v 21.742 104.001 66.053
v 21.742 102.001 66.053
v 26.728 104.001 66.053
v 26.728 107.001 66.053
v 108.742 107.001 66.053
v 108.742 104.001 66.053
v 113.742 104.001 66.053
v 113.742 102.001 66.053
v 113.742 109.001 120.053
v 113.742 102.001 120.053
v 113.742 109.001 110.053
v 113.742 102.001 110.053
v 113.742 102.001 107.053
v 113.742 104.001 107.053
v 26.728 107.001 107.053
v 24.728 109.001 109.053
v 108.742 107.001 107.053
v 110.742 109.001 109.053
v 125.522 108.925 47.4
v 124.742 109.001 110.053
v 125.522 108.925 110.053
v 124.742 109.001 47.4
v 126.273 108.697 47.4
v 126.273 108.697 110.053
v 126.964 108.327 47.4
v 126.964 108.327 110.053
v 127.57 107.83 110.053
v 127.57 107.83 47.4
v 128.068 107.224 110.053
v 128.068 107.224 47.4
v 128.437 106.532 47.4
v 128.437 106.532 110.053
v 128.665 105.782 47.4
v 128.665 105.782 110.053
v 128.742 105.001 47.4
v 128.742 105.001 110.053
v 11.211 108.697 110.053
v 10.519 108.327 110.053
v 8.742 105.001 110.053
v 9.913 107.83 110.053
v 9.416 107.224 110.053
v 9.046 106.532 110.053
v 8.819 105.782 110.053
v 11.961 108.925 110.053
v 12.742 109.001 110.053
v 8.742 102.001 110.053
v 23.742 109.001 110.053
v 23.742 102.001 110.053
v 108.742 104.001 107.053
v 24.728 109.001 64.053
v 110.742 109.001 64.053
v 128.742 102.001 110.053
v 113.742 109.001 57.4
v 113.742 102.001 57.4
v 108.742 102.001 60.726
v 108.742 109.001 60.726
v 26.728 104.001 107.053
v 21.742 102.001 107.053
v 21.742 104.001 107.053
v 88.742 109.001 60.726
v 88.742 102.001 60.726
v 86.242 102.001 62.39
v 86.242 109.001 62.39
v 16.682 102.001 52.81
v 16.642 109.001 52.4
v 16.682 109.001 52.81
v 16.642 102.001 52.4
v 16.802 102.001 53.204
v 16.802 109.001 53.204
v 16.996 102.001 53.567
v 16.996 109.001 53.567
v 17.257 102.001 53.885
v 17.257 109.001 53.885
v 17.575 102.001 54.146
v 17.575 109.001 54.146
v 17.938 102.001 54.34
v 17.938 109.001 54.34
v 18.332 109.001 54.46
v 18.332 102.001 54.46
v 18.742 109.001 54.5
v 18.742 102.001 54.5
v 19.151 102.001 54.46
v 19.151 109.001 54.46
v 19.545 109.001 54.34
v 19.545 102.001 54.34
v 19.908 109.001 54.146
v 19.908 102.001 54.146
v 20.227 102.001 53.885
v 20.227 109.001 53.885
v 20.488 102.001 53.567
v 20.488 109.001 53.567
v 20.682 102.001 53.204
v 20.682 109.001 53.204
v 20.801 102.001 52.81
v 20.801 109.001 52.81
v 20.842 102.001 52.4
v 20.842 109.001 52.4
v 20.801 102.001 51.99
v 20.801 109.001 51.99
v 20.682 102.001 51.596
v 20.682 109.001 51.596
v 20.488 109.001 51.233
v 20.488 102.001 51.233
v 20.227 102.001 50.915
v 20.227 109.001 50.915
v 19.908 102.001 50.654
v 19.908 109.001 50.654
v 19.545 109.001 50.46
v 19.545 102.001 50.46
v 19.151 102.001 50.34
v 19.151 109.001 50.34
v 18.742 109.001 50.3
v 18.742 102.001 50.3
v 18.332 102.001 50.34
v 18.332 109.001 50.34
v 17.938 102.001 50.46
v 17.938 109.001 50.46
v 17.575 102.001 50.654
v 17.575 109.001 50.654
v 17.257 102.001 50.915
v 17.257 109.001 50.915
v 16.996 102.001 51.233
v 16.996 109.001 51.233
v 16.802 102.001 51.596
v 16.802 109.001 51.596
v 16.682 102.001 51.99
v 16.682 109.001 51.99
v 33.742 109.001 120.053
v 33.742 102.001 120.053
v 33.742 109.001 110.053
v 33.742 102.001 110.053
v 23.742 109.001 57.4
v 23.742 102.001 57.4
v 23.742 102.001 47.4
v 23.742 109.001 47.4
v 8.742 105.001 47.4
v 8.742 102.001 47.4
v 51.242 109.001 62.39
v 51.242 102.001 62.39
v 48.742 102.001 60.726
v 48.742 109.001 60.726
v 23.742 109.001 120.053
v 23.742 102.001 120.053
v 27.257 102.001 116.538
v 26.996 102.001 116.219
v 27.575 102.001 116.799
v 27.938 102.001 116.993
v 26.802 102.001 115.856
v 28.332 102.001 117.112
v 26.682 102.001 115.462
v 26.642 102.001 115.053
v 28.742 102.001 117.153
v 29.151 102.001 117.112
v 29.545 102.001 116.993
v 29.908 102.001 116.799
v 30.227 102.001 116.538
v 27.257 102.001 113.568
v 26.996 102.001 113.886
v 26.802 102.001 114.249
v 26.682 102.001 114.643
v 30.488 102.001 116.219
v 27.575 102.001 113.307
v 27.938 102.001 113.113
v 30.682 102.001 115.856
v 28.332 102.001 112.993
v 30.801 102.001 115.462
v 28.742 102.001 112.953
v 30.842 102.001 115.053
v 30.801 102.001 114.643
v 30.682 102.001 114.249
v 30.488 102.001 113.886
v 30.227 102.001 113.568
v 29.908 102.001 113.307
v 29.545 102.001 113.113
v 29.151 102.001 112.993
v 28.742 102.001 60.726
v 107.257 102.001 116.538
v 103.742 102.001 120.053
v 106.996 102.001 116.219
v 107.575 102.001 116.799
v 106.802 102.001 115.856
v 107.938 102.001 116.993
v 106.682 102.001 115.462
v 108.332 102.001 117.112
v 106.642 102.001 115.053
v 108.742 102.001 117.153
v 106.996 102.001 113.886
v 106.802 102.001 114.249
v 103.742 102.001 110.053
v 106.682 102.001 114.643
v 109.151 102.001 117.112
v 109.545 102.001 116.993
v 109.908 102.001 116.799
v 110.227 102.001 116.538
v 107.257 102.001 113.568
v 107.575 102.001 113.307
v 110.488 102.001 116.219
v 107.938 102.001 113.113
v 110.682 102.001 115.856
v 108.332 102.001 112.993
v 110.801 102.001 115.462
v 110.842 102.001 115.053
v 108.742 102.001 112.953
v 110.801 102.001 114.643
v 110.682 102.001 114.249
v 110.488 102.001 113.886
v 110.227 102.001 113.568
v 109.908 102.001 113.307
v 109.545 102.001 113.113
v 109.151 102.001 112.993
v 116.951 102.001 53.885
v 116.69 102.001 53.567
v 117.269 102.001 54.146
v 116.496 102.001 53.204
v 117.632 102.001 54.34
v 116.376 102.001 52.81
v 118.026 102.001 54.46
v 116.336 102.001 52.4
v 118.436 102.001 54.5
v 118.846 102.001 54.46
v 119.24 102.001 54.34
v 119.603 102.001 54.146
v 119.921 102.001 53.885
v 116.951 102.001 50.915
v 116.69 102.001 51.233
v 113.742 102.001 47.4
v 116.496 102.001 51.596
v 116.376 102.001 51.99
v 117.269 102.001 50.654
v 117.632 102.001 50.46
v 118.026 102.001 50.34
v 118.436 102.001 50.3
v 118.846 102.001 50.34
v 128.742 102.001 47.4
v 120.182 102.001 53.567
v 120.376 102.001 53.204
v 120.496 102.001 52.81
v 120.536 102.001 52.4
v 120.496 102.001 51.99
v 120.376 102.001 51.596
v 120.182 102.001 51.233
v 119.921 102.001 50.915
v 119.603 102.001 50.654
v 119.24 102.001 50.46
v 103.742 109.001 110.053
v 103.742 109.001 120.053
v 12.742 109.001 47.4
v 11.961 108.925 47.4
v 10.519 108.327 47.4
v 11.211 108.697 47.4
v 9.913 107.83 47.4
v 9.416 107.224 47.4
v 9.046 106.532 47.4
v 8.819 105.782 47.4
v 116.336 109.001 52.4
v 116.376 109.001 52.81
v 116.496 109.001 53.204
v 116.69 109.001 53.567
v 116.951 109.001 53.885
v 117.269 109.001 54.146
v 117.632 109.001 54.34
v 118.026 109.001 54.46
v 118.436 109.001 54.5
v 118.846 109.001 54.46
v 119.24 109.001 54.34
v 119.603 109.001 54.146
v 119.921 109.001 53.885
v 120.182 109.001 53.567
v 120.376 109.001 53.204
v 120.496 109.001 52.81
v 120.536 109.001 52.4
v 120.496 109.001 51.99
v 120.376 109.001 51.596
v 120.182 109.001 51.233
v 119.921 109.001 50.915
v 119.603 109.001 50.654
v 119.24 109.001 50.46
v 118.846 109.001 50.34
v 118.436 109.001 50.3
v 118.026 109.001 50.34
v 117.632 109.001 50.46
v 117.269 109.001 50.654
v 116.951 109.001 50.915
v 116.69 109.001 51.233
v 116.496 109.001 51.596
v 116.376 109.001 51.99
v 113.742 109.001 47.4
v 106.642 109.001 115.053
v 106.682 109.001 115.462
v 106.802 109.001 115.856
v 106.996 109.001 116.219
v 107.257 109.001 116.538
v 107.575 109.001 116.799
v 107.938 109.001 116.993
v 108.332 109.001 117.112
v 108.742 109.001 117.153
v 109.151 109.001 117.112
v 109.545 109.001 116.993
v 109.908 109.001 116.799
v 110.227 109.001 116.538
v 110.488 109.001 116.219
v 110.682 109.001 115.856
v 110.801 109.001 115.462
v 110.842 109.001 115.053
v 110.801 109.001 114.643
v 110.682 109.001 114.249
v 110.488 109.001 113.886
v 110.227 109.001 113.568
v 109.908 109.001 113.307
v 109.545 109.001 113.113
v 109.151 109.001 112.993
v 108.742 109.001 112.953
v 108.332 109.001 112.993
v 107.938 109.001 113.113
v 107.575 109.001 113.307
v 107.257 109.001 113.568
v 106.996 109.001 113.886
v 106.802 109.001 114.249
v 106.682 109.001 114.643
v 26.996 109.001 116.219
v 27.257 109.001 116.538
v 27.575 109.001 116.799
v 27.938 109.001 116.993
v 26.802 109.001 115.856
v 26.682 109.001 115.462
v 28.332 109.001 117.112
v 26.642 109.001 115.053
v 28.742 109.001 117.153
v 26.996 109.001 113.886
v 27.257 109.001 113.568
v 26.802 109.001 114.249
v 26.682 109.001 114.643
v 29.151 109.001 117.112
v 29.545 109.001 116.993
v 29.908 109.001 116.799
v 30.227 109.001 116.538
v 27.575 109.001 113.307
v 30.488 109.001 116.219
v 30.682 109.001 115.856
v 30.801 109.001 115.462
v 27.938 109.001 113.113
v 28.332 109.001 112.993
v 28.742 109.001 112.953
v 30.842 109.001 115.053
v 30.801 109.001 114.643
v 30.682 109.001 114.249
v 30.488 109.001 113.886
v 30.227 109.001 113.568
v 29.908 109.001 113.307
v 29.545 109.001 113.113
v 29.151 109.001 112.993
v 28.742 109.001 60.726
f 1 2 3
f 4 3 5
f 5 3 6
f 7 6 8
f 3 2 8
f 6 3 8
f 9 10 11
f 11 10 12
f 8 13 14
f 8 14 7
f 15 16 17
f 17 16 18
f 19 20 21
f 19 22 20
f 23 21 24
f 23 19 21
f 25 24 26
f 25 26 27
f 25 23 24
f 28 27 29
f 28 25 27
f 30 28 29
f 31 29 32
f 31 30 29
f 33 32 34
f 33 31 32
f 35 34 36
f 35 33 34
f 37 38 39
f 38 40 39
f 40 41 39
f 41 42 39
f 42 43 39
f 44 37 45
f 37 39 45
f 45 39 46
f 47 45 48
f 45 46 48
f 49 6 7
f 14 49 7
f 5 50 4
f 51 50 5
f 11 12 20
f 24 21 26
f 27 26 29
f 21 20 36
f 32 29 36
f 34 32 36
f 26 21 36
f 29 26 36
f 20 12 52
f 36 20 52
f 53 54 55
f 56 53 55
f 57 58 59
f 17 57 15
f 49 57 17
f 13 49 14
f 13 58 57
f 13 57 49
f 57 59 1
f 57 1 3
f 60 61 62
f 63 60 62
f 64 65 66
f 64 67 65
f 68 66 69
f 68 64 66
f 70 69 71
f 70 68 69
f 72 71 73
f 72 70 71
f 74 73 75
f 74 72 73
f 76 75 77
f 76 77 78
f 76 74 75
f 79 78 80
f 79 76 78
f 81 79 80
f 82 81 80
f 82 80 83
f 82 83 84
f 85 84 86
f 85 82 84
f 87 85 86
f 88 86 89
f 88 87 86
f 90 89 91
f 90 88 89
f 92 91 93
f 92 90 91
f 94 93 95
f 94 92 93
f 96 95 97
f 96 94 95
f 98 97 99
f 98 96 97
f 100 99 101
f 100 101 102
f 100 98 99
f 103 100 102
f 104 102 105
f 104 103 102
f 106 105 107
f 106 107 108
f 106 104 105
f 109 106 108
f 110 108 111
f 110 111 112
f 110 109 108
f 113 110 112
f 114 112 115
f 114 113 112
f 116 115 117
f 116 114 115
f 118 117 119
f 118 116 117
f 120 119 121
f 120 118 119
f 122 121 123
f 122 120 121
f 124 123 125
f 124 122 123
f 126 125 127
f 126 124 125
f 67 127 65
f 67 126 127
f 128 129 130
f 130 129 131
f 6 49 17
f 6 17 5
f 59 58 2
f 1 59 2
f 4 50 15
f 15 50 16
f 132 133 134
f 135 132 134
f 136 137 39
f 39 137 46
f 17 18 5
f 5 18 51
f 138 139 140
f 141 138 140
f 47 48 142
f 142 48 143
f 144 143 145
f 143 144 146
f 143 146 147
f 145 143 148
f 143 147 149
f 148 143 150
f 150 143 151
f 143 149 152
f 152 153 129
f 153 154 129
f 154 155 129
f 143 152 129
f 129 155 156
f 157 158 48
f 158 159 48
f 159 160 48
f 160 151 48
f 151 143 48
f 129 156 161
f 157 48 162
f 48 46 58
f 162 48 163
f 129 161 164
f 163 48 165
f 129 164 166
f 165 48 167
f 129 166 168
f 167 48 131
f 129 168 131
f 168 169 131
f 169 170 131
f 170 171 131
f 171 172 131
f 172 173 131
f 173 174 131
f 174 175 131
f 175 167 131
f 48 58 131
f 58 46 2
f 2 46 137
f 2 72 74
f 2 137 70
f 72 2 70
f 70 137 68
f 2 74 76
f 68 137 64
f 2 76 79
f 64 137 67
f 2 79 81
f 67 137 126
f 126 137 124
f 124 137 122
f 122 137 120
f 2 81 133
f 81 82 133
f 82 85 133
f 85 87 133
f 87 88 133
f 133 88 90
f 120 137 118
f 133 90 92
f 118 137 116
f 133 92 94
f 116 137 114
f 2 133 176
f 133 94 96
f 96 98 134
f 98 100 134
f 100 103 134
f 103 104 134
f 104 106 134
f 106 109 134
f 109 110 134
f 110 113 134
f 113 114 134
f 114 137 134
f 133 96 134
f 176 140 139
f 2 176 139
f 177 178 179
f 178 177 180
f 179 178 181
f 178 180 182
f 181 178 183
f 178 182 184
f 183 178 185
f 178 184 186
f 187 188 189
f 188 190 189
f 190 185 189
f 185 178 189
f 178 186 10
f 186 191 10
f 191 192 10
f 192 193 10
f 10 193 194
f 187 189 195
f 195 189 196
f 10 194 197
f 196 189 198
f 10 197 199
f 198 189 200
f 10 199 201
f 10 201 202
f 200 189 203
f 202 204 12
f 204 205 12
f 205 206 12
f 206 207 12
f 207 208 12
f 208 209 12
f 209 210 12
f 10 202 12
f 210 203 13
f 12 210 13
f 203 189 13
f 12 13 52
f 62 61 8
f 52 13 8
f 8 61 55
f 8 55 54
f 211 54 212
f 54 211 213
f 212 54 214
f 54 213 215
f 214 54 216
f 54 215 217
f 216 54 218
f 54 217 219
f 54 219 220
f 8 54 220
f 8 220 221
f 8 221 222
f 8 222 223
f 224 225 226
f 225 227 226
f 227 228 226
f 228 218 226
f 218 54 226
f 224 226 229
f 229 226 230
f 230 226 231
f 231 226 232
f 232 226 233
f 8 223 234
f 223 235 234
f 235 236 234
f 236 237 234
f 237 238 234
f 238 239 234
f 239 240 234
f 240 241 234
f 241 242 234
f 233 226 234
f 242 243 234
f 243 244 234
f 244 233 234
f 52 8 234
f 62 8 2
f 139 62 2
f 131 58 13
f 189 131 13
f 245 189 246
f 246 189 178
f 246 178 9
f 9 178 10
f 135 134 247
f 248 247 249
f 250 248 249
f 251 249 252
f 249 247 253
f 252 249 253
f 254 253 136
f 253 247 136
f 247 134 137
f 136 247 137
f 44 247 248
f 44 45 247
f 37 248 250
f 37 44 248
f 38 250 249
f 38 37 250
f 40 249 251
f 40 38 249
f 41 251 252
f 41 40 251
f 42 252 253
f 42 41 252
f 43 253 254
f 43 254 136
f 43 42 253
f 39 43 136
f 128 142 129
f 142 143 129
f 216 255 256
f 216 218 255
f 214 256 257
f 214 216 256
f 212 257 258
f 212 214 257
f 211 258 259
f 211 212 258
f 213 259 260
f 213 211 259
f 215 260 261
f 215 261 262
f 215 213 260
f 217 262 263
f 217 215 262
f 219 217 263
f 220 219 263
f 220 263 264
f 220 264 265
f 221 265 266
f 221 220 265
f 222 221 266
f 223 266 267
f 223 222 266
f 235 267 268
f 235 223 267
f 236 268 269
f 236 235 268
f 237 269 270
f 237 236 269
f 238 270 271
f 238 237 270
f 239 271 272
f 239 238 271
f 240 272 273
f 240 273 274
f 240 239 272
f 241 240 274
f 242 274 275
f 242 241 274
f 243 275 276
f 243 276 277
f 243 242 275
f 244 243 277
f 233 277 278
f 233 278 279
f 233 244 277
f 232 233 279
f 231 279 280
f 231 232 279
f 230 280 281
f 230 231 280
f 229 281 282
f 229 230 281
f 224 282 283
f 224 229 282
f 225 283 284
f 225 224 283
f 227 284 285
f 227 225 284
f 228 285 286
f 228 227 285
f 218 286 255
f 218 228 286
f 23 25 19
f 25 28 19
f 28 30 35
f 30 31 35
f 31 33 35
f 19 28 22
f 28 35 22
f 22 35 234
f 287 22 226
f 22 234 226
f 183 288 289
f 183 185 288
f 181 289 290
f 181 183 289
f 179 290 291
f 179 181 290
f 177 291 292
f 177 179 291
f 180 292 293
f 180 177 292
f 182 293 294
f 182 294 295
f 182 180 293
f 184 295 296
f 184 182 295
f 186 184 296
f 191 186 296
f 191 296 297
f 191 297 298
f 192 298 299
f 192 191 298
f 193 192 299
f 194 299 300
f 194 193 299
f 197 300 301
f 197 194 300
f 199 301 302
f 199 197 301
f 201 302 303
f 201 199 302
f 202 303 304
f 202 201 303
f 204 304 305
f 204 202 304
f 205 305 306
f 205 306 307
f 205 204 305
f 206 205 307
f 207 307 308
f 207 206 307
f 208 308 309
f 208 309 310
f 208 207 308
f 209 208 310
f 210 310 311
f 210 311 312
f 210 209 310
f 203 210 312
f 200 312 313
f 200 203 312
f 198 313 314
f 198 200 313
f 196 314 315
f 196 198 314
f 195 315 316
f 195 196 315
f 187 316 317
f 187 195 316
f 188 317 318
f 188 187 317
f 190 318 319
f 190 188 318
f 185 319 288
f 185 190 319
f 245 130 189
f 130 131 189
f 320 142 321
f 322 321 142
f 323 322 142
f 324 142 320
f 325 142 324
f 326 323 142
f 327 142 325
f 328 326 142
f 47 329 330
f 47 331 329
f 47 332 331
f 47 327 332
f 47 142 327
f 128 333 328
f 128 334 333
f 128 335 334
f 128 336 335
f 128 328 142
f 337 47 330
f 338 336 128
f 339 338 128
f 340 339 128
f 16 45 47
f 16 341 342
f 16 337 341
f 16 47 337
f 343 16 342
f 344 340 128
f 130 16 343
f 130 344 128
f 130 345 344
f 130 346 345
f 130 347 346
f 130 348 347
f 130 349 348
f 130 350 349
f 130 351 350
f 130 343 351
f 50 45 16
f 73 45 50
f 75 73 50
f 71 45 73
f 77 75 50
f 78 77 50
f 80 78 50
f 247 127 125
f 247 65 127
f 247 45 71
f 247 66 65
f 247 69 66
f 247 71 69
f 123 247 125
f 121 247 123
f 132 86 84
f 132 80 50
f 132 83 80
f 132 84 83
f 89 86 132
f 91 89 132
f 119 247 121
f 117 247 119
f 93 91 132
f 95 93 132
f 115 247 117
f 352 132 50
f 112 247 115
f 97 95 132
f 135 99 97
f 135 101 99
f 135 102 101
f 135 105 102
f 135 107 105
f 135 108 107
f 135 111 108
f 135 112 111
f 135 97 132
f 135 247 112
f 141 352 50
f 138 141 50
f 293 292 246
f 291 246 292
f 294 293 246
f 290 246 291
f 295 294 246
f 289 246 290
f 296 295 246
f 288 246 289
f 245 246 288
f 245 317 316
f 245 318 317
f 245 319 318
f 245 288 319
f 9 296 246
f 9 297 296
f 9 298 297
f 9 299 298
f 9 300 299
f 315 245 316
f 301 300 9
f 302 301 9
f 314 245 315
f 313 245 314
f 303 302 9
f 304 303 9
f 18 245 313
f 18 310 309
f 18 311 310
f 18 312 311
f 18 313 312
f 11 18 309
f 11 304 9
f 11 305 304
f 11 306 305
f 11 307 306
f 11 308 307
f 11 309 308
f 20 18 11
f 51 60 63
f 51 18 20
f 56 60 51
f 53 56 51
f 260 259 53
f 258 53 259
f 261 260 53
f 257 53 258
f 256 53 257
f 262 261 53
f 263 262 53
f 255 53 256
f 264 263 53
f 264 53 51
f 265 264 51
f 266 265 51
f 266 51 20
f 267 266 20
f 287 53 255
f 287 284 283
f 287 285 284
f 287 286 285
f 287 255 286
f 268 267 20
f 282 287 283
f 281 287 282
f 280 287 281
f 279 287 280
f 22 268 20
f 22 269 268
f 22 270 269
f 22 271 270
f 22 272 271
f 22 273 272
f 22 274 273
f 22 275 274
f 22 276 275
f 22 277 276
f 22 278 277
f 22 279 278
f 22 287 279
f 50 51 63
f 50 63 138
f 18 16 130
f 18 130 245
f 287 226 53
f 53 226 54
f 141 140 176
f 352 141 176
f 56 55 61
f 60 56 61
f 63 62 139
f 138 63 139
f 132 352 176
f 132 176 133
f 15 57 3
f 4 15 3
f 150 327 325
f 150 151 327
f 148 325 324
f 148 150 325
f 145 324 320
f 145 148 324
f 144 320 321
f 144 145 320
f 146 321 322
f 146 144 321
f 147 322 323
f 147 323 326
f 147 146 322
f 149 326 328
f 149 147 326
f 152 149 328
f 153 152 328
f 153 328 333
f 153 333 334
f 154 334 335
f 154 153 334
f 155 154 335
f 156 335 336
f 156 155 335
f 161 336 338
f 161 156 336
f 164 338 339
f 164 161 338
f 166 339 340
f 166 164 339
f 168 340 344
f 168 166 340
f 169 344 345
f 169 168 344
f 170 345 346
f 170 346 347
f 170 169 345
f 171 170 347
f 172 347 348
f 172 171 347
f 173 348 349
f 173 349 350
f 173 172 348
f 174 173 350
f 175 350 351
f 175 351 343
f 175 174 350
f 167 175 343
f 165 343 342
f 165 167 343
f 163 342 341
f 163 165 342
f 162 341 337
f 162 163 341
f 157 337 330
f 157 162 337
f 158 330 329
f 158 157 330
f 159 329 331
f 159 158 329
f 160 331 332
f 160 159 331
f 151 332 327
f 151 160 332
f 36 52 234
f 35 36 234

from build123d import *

# Parameters (mm, degrees)
SKETCH_1_R      = 2.1
SKETCH_1_W      = 92
SKETCH_1_H      = 41
EXTRUDE_2_DEPTH = 2
SKETCH_2_R      = 2.1
SKETCH_2_W      = 82.013427323
SKETCH_2_H      = 41
EXTRUDE_5_DEPTH = 5
CHAMFER_START   = 102.001425994
CHAMFER_1_DEPTH = 7
FILLET_1_R      = 4


with BuildPart() as part:
    # Эскиз1 → Бобышка-Вытянуть2 (new body)
    with BuildSketch(Plane(origin=(68.741769048, 102.001425994, 80.052702475), x_dir=(1, 0, 0), z_dir=(0, 1, 0))):
        Polygon((-60, -30), (-45, -30), (-45, -40), (-35, -40), (-35, -30), (35, -30), (35, -40), (45, -40), (45, -30), (60, -30), (60, 32.652702475), (45, 32.652702475), (45, 22.652702475), (55, 22.652702475), (55, 16), (-55, 16), (-55, 22.652702475), (-45, 22.652702475), (-45, 32.652702475), (-60, 32.652702475), align=None)
        with Locations(Location((-50, 27.652702475, 0), (0, 0, 180))):
            Circle(SKETCH_1_R, mode=Mode.SUBTRACT)
        with Locations(Location((49.694344906, 27.652702475, 0), (0, 0, 180))):
            Circle(SKETCH_1_R, mode=Mode.SUBTRACT)
        with Locations(Location((40, -35, 0), (0, 0, 180))):
            Circle(SKETCH_1_R, mode=Mode.SUBTRACT)
        with Locations(Location((-40, -35, 0), (0, 0, 180))):
            Circle(SKETCH_1_R, mode=Mode.SUBTRACT)
        with Locations((-1, -6.5)):
            Rectangle(SKETCH_1_W, SKETCH_1_H, mode=Mode.SUBTRACT)
    extrude(amount=EXTRUDE_2_DEPTH)

    # Эскиз2 → Бобышка-Вытянуть5 (add)
    with BuildSketch(Plane(origin=(0, 104.001425994, 0), x_dir=(1, 0, 0), z_dir=(0, 1, 0))):
        Polygon((23.741769048, -57.4), (23.741769048, -47.4), (8.741769048, -47.4), (8.741769048, -110.052702475), (23.741769048, -110.052702475), (23.741769048, -120.052702475), (33.741769048, -120.052702475), (33.741769048, -110.052702475), (103.741769048, -110.052702475), (103.741769048, -120.052702475), (113.741769048, -120.052702475), (113.741769048, -110.052702475), (128.741769048, -110.052702475), (128.741769048, -47.4), (113.741769048, -47.4), (113.741769048, -57.4), (123.741769048, -57.4), (123.741769048, -64.052702475), (13.741769048, -64.052702475), (13.741769048, -57.4), align=None)
        with Locations(Location((18.741769048, -52.4, 0), (0, 0, 180))):
            Circle(SKETCH_2_R, mode=Mode.SUBTRACT)
        with Locations(Location((118.436113954, -52.4, 0), (0, 0, 180))):
            Circle(SKETCH_2_R, mode=Mode.SUBTRACT)
        with Locations(Location((108.741769048, -115.052702475, 0), (0, 0, 180))):
            Circle(SKETCH_2_R, mode=Mode.SUBTRACT)
        with Locations(Location((28.741769048, -115.052702475, 0), (0, 0, 180))):
            Circle(SKETCH_2_R, mode=Mode.SUBTRACT)
        with Locations((67.735055387, -86.552702475)):
            Rectangle(SKETCH_2_W, SKETCH_2_H, mode=Mode.SUBTRACT)
    extrude(amount=EXTRUDE_5_DEPTH)

    # Фаска1: read off the stored shape, not the designer's step
    # Фаска1 outline → Фаска1 (add)
    with BuildSketch(Plane(origin=(0, 0, 0), x_dir=(1, 0, 0), z_dir=(0, 1, 0)).offset(CHAMFER_START)):
        Polygon((28.741769048, -60.726351237), (23.741769048, -57.4), (13.741769048, -57.4), (13.741769048, -64.052702475), (123.741769048, -64.052702475), (123.741769048, -57.4), (113.741769048, -57.4), (108.741769048, -60.726351237), (88.741769048, -60.726351237), (86.241769048, -62.389526856), (51.241769048, -62.389526856), (48.741769048, -60.726351237), align=None)
    extrude(amount=CHAMFER_1_DEPTH)

    # Chamfer 1 2: loft between two sections, ruled curve by curve
    chamfer_1_2_from = [
        Edge.make_line((26.728341725, 107.001425994, 66.052702475), (26.728341725, 107.001425994, 107.052702475)),
        Edge.make_line((26.728341725, 107.001425994, 107.052702475), (108.741769048, 107.001425994, 107.052702475)),
        Edge.make_line((26.728341725, 107.001425994, 66.052702475), (108.741769048, 107.001425994, 66.052702475)),
        Edge.make_line((108.741769048, 107.001425994, 107.052702475), (108.741769048, 107.001425994, 66.052702475)),
    ]
    chamfer_1_2_to = [
        Edge.make_line((24.728341725, 109.001425994, 64.052702475), (24.728341725, 109.001425994, 109.052702475)),
        Edge.make_line((24.728341725, 109.001425994, 109.052702475), (110.741769048, 109.001425994, 109.052702475)),
        Edge.make_line((24.728341725, 109.001425994, 64.052702475), (110.741769048, 109.001425994, 64.052702475)),
        Edge.make_line((110.741769048, 109.001425994, 109.052702475), (110.741769048, 109.001425994, 64.052702475)),
    ]
    chamfer_1_2 = Solid(Shell([*[Face.make_surface_from_curves(chamfer_1_2_from[k], chamfer_1_2_to[k]) for k in range(4)], Face(Wire(chamfer_1_2_from)), Face(Wire(chamfer_1_2_to))]))
    add(chamfer_1_2, mode=Mode.SUBTRACT)

    # Скругление1
    fillet_1_edges = [part.edges().sort_by_distance(p)[0] for p in [
        (8.741769048, 109.001425994, 78.726351237),
        (128.741769048, 109.001425994, 78.726351237),
    ]]
    fillet(fillet_1_edges, radius=FILLET_1_R)


solid = part.part
